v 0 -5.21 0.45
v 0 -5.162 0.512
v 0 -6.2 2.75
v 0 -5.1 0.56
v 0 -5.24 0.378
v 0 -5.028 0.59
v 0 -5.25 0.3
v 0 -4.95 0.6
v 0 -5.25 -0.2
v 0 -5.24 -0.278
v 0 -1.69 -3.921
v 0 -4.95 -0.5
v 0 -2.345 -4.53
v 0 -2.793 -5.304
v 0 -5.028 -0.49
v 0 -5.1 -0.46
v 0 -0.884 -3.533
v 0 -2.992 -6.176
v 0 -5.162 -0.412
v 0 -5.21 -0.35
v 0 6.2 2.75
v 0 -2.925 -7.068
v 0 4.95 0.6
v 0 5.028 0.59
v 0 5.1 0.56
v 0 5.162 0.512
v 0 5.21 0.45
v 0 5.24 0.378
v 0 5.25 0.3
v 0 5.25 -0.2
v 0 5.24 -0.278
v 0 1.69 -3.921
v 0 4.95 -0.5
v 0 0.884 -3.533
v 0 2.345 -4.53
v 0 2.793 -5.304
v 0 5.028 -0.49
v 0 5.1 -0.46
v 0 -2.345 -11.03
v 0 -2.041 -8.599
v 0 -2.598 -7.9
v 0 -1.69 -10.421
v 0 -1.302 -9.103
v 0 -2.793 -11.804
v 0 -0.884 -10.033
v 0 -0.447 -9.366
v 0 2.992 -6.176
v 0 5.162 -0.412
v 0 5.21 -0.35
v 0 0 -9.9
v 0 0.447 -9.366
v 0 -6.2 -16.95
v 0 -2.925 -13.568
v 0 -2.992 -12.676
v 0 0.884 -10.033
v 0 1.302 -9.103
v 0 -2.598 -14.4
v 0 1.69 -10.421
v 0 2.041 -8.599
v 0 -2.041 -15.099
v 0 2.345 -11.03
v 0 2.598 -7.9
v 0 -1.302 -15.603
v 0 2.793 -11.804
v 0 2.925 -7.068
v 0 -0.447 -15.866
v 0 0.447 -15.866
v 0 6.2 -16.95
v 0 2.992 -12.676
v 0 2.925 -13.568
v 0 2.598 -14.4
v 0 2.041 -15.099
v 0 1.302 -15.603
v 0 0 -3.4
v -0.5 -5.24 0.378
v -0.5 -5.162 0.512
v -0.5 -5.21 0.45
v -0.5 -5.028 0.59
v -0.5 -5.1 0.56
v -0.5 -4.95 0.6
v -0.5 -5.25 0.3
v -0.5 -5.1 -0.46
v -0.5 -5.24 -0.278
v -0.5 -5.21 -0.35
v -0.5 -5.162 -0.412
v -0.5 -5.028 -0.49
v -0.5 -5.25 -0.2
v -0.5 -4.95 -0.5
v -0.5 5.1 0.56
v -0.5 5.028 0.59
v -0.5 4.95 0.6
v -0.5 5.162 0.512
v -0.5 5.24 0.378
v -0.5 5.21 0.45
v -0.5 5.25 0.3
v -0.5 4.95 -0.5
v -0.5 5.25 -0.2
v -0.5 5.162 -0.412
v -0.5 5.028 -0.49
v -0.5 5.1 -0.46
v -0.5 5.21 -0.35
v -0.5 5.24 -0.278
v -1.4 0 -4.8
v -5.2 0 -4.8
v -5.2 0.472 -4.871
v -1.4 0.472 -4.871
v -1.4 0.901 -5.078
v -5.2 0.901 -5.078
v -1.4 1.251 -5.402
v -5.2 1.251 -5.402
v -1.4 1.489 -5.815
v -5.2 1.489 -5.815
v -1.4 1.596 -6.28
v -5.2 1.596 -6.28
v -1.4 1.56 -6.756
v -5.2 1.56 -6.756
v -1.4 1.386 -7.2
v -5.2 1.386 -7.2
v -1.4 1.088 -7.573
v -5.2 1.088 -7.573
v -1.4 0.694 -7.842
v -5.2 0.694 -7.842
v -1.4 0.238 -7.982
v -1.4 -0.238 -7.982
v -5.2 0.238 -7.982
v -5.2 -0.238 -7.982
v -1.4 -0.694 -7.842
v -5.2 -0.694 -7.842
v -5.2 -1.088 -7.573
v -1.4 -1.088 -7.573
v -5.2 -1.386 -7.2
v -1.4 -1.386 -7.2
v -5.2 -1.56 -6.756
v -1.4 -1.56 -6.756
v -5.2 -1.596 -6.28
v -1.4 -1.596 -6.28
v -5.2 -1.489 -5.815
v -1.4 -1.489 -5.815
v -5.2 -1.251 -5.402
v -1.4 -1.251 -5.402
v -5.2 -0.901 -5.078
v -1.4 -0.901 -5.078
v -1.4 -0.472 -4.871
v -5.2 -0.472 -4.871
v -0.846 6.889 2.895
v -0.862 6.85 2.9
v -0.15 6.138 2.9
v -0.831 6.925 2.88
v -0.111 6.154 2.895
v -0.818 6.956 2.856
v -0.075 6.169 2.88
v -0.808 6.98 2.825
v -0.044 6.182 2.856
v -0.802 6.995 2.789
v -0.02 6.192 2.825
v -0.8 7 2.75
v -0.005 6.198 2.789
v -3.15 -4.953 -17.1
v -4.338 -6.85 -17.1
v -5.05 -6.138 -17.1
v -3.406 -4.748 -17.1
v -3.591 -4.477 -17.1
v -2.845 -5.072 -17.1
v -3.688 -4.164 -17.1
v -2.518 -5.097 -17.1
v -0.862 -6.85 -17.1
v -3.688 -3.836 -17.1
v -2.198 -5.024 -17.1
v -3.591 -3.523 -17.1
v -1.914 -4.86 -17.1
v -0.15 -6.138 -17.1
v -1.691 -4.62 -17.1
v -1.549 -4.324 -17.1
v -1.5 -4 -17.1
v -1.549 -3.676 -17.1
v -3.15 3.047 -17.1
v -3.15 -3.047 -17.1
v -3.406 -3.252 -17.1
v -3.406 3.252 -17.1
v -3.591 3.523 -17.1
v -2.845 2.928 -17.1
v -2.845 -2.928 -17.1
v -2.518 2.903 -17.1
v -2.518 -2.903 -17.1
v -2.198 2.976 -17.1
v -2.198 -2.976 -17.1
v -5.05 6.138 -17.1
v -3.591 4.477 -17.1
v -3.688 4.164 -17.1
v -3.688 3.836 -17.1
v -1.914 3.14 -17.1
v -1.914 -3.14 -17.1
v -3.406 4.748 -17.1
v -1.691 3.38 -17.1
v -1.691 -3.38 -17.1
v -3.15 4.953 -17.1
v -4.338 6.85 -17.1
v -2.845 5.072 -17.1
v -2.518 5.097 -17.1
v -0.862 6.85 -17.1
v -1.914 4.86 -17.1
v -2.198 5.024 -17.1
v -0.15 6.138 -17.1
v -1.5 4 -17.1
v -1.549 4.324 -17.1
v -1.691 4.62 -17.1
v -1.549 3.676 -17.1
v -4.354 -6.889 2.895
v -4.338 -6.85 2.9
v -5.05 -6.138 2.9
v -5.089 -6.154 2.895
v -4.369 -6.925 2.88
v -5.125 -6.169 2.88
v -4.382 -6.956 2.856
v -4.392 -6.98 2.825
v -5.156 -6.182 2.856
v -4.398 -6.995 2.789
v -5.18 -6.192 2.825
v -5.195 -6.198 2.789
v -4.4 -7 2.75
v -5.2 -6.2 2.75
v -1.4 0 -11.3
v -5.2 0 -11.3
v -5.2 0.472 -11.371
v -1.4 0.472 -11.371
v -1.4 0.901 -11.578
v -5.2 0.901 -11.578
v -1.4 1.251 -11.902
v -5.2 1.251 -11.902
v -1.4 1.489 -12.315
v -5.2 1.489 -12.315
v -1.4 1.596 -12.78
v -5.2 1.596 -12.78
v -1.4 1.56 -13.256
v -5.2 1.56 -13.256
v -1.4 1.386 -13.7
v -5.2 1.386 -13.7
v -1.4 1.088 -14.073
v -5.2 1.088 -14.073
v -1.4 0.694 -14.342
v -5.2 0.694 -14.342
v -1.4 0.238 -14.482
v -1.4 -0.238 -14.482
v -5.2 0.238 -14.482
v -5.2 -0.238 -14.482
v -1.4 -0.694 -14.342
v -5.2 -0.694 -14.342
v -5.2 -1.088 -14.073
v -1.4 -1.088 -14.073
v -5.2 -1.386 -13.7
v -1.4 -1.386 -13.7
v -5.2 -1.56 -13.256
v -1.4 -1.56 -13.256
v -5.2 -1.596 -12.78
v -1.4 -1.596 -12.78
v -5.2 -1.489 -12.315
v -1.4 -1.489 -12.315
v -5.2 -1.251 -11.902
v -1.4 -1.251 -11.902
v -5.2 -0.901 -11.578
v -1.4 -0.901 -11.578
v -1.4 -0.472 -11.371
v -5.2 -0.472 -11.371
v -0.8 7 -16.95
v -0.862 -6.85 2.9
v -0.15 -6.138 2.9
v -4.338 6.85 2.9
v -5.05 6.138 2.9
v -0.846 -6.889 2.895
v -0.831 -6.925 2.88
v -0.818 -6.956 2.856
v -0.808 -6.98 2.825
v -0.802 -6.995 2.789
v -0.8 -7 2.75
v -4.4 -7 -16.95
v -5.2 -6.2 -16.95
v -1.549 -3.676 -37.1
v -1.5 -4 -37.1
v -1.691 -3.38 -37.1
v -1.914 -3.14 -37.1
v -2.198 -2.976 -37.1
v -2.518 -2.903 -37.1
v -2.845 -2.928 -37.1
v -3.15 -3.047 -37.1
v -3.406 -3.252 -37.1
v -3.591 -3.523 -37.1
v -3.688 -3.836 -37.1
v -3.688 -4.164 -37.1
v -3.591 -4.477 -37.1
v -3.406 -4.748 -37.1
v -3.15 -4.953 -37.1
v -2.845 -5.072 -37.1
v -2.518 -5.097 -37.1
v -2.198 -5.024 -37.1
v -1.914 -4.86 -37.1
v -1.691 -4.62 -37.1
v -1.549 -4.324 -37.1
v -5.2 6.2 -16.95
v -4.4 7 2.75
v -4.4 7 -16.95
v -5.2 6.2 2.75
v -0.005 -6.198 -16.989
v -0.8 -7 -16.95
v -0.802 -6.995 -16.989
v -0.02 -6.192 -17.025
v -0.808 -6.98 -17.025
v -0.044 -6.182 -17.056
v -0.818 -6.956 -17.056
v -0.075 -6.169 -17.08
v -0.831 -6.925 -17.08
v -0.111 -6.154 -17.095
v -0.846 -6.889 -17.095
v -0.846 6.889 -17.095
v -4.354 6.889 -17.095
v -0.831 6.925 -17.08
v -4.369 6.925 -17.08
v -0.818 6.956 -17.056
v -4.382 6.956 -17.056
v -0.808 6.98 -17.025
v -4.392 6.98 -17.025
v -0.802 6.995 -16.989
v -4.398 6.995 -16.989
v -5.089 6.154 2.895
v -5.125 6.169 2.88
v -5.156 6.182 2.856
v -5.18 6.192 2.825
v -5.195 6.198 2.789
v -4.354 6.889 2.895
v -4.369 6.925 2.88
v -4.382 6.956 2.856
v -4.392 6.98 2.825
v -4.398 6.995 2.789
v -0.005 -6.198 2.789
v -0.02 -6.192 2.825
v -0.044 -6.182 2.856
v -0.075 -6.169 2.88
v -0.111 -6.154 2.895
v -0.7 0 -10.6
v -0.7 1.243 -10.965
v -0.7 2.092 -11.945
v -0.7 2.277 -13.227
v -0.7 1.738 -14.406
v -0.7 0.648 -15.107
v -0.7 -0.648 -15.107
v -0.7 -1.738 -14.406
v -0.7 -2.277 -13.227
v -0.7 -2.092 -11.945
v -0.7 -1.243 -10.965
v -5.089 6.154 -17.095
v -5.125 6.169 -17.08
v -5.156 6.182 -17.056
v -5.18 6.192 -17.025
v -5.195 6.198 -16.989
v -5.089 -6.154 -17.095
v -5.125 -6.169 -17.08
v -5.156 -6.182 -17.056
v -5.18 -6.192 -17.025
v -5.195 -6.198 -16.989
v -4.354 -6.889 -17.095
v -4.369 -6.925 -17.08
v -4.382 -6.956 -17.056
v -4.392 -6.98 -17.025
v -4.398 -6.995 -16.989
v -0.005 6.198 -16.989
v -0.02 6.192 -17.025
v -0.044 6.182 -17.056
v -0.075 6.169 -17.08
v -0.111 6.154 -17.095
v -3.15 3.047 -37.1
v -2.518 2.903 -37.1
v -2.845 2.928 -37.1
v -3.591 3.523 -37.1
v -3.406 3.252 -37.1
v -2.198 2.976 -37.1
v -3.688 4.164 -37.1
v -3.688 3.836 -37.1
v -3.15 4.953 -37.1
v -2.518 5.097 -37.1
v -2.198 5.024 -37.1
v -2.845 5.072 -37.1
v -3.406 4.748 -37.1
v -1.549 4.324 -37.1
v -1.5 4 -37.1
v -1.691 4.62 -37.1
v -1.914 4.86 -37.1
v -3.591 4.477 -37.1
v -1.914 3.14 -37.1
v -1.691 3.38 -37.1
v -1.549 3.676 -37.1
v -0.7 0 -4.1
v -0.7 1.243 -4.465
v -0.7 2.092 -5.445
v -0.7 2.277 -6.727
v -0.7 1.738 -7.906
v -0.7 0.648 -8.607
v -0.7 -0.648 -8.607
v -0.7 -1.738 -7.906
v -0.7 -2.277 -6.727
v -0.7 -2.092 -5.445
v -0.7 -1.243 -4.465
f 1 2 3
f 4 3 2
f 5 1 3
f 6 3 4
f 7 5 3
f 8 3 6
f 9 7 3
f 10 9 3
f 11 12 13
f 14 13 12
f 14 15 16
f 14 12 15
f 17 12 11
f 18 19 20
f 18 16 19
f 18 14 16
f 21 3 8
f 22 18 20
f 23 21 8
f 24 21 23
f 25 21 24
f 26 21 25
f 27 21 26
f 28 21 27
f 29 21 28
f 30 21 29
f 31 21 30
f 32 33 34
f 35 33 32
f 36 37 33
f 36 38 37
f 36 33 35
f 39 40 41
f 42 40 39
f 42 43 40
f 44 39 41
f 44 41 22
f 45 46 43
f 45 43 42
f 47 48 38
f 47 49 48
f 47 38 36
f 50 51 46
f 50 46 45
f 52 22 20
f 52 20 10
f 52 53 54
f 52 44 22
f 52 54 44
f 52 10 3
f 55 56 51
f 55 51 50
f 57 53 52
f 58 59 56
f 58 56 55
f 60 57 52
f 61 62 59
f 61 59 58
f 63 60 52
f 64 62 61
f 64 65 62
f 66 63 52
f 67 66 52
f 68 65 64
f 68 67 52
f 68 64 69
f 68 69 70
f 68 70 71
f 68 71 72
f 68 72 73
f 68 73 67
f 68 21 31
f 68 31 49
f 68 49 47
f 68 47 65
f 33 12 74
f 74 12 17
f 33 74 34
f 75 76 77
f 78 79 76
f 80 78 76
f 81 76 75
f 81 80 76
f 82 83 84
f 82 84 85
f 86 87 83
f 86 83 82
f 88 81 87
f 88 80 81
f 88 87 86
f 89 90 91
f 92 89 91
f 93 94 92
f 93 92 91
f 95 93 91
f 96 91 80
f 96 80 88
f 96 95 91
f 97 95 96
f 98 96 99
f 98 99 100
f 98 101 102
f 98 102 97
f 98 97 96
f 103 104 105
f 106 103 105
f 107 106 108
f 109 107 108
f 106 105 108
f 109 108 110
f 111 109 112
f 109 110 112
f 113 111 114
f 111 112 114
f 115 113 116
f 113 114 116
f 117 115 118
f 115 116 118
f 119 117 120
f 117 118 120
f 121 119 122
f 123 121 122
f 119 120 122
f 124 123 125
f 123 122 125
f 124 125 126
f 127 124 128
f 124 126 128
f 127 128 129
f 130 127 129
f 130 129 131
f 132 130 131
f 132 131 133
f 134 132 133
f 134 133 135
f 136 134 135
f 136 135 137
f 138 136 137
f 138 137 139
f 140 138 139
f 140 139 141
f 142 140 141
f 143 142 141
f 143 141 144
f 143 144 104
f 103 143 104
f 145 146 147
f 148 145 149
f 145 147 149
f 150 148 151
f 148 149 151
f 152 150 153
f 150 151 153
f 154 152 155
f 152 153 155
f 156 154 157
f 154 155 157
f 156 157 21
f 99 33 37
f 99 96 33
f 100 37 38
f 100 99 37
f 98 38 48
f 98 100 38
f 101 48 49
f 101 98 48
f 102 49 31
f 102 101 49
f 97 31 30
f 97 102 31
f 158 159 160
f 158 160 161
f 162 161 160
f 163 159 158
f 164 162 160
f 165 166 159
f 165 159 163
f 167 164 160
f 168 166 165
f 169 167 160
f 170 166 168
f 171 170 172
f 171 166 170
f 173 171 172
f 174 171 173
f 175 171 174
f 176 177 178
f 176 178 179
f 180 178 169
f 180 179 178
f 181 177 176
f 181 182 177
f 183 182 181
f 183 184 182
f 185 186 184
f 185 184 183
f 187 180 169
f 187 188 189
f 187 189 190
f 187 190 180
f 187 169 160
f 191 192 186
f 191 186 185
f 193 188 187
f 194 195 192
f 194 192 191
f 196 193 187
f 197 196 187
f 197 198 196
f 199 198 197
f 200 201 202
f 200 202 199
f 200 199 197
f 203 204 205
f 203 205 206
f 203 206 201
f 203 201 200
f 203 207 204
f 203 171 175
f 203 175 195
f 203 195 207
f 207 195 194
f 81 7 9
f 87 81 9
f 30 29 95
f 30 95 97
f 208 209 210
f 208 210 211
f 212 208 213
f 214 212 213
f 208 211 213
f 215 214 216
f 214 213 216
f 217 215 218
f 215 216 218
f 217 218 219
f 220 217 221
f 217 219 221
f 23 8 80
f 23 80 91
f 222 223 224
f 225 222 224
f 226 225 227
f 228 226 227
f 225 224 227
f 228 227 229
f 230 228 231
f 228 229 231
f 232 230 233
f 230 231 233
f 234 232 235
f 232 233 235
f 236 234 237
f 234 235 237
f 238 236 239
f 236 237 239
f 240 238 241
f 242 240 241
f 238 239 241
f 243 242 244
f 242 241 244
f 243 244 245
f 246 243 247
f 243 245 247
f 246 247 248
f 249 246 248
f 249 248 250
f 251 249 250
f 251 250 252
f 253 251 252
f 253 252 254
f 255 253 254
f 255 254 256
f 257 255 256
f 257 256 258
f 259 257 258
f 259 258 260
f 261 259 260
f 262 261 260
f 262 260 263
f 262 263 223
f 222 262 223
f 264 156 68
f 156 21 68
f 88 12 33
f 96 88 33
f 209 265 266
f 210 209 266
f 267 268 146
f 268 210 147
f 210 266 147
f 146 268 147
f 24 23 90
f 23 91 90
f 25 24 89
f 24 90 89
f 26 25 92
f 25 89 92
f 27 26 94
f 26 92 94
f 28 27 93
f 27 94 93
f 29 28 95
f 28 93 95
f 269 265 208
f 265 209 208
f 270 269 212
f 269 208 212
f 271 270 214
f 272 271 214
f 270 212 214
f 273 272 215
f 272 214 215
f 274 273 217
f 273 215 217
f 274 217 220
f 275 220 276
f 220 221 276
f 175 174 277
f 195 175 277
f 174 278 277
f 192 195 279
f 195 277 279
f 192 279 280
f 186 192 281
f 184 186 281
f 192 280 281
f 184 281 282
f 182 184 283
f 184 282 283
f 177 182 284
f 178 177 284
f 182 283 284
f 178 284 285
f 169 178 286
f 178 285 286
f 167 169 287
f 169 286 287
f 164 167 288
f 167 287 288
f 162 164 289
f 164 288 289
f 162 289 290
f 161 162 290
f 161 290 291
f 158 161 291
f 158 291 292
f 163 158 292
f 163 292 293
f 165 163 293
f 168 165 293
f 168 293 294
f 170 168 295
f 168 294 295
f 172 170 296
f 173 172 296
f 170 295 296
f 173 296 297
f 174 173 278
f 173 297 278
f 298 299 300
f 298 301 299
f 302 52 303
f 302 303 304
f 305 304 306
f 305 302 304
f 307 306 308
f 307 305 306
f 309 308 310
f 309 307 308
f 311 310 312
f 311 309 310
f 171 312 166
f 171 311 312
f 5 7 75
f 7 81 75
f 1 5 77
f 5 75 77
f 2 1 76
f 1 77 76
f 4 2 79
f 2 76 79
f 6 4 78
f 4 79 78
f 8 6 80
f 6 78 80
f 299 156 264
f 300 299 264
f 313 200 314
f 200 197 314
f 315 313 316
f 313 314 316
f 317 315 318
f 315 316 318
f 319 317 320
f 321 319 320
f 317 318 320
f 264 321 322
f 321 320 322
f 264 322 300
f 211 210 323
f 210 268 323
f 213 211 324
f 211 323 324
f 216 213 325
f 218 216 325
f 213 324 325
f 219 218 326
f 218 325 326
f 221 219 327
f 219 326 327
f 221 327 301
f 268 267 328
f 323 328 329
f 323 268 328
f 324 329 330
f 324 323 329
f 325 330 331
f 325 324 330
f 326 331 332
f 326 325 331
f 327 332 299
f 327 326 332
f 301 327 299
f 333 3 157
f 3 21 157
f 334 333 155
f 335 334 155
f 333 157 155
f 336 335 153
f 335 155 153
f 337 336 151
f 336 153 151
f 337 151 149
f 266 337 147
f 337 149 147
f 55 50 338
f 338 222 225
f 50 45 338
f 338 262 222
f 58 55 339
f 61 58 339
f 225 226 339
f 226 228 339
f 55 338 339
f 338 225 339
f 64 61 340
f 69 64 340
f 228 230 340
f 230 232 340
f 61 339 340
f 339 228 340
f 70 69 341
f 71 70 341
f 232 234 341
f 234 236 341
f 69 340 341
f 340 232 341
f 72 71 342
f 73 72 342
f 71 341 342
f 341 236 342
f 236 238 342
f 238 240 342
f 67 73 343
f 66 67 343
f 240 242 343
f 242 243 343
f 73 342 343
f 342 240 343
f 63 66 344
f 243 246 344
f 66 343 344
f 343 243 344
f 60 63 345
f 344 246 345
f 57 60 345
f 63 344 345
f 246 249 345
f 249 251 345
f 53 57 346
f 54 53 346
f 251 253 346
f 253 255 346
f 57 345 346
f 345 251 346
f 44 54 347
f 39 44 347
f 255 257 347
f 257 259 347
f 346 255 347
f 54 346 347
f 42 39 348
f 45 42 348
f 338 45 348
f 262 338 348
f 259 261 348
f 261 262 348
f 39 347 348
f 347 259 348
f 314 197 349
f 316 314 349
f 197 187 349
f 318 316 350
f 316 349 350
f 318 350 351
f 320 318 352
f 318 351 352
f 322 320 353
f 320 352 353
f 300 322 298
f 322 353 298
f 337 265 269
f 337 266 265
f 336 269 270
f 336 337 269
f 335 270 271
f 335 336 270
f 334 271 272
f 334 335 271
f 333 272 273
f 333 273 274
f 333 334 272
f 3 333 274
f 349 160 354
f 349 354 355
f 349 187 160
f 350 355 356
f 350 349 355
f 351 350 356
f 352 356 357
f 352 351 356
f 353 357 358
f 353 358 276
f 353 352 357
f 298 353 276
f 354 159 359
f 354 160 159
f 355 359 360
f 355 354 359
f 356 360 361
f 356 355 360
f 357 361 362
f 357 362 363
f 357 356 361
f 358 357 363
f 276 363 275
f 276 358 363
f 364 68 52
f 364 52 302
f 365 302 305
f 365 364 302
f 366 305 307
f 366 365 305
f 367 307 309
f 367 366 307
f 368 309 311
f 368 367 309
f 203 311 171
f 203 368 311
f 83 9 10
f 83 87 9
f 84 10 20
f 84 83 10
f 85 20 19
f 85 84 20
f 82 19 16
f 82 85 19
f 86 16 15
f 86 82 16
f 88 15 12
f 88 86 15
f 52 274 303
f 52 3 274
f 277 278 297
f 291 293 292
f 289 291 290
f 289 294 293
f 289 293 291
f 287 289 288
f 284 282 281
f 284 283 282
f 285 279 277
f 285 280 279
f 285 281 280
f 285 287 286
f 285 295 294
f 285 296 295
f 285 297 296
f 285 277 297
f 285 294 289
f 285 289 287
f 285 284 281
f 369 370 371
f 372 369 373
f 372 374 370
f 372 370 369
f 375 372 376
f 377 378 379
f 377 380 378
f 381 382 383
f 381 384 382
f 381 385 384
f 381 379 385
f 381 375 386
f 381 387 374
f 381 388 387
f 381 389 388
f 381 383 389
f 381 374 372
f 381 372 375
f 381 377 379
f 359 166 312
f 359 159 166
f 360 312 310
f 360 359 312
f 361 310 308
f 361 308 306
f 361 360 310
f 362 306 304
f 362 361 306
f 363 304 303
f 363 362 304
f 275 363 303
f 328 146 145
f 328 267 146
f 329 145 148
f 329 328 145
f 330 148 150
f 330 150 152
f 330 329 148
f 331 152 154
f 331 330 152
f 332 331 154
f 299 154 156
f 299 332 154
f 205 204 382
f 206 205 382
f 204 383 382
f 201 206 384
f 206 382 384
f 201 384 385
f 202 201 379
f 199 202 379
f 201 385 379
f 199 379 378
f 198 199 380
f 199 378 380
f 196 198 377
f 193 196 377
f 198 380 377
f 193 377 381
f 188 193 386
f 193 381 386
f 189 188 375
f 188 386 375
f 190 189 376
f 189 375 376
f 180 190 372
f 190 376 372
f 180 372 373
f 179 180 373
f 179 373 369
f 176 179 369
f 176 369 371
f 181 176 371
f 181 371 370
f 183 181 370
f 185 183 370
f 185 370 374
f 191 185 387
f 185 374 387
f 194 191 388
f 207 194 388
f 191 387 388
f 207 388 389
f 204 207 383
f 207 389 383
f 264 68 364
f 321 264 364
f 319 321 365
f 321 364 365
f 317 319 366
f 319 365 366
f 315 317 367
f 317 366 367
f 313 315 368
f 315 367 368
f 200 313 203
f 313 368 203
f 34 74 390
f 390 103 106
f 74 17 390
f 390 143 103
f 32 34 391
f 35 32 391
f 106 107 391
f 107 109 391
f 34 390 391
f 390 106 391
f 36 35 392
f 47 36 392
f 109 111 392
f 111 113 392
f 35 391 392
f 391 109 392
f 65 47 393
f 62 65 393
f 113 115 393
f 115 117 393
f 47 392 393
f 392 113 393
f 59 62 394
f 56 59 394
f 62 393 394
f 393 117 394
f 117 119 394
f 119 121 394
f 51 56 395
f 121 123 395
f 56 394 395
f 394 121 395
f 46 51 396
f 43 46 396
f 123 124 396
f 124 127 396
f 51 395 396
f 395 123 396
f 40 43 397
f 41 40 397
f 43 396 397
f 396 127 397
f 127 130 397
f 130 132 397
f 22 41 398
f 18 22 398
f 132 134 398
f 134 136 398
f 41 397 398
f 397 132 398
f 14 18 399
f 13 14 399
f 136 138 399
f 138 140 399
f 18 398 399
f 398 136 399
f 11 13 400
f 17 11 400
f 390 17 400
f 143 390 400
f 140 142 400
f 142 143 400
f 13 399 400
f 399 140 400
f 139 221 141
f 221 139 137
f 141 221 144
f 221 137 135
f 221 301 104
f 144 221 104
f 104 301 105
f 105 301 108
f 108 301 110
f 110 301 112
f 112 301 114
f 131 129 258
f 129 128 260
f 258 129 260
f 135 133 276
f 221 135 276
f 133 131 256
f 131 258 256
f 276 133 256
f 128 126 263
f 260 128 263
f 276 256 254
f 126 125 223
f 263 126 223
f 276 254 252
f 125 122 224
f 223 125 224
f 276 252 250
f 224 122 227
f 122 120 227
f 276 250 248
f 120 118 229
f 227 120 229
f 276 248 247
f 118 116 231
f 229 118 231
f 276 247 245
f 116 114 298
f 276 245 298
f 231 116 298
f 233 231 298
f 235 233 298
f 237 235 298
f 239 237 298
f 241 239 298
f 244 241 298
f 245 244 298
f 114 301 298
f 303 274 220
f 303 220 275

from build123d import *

# Parameters (mm, degrees)
SKETCH1_W                      = 20
SKETCH1_H                      = 14
BOSS_EXTRUDE1_DEPTH            = 5.2
SKETCH2_W                      = 1.1
SKETCH2_H                      = 10.5
CUT_EXTRUDE1_DEPTH             = 0.5
SKETCH3_W                      = 1.1
SKETCH3_H                      = 20
SKETCH4_W                      = 1.1
SKETCH4_H                      = 20
F_3_2_3_2_DIAMETER_HOLE1_D     = 3.2
F_3_2_3_2_DIAMETER_HOLE1_DEPTH = 5.2
CHAMFER1_SIZE                  = 0.8
CHAMFER2_SIZE                  = 1.4
FILLET1_R                      = 0.15
FILLET2_R                      = 0.3


with BuildPart() as part:
    # Sketch1 → Boss-Extrude1 (new body)
    with BuildSketch(Plane(origin=(0, 0, 0), x_dir=(0, 0, -1), z_dir=(1, 0, 0))):
        with Locations((7.1, 0)):
            Rectangle(SKETCH1_W, SKETCH1_H)
    extrude(amount=-BOSS_EXTRUDE1_DEPTH)

    # Sketch2 → Cut-Extrude1 (cut)
    with BuildSketch(Plane(origin=(0, 0, 0), x_dir=(0, 0, -1), z_dir=(1, 0, 0))):
        with Locations((-0.05, 0)):
            Rectangle(SKETCH2_W, SKETCH2_H)
    extrude(amount=-CUT_EXTRUDE1_DEPTH, mode=Mode.SUBTRACT)

    # Sketch3 → Revolve1 (revolve)
    with BuildSketch(Plane(origin=(0, -4, 0), x_dir=(1, 0, 0), z_dir=(0, 1, 0))):
        with Locations((-2.05, 27.1)):
            Rectangle(SKETCH3_W, SKETCH3_H)
    revolve(axis=Axis((-2.6, -4, -37.1), (0, 0, 1)))

    # Sketch4 → Revolve2 (revolve)
    with BuildSketch(Plane(origin=(0, 4, 0), x_dir=(1, 0, 0), z_dir=(0, 1, 0))):
        with Locations((-2.05, 27.1)):
            Rectangle(SKETCH4_W, SKETCH4_H)
    revolve(axis=Axis((-2.6, 4, -37.1), (0, 0, 1)))

    # Ø3.2 (3.2) Diameter Hole1
    with Locations(Plane(origin=(0, 0, 0), x_dir=(0, 0, -1), z_dir=(1, 0, 0))):
        with Locations((12.9, 0), (6.4, 0)):
            Hole(F_3_2_3_2_DIAMETER_HOLE1_D / 2, depth=F_3_2_3_2_DIAMETER_HOLE1_DEPTH)

    # Chamfer1
    chamfer1_edges = [part.edges().sort_by_distance(p)[0] for p in [
        (-5.2, 7, -7.1),
        (-5.2, -7, -7.1),
        (0, 7, -7.1),
        (0, -7, -7.1),
    ]]
    chamfer(chamfer1_edges, length=CHAMFER1_SIZE)

    # Chamfer2
    chamfer2_edges = [part.edges().sort_by_distance(p)[0] for p in [
        (0, 0, -8),
        (0, 0, -14.5),
    ]]
    chamfer(chamfer2_edges, length=CHAMFER2_SIZE)

    # Fillet1
    fillet1_edges = [part.edges().sort_by_distance(p)[0] for p in [
        (0, 0, -17.1),
        (0, 0, 2.9),
        (-2.6, 7, 2.9),
        (-5.2, 0, 2.9),
        (-2.6, -7, 2.9),
        (-4.8, 6.6, 2.9),
        (-4.8, -6.6, 2.9),
        (-0.4, -6.6, 2.9),
        (-0.4, 6.6, 2.9),
        (-2.6, 7, -17.1),
        (-2.6, -7, -17.1),
        (-5.2, 0, -17.1),
        (-4.8, 6.6, -17.1),
        (-4.8, -6.6, -17.1),
        (-0.4, -6.6, -17.1),
        (-0.4, 6.6, -17.1),
    ]]
    fillet(fillet1_edges, radius=FILLET1_R)

    # Fillet2
    fillet2_edges = [part.edges().sort_by_distance(p)[0] for p in [
        (-0.25, -5.25, -0.5),
        (-0.25, -5.25, 0.6),
        (-0.25, 5.25, 0.6),
        (-0.25, 5.25, -0.5),
    ]]
    fillet(fillet2_edges, radius=FILLET2_R)


solid = part.part
